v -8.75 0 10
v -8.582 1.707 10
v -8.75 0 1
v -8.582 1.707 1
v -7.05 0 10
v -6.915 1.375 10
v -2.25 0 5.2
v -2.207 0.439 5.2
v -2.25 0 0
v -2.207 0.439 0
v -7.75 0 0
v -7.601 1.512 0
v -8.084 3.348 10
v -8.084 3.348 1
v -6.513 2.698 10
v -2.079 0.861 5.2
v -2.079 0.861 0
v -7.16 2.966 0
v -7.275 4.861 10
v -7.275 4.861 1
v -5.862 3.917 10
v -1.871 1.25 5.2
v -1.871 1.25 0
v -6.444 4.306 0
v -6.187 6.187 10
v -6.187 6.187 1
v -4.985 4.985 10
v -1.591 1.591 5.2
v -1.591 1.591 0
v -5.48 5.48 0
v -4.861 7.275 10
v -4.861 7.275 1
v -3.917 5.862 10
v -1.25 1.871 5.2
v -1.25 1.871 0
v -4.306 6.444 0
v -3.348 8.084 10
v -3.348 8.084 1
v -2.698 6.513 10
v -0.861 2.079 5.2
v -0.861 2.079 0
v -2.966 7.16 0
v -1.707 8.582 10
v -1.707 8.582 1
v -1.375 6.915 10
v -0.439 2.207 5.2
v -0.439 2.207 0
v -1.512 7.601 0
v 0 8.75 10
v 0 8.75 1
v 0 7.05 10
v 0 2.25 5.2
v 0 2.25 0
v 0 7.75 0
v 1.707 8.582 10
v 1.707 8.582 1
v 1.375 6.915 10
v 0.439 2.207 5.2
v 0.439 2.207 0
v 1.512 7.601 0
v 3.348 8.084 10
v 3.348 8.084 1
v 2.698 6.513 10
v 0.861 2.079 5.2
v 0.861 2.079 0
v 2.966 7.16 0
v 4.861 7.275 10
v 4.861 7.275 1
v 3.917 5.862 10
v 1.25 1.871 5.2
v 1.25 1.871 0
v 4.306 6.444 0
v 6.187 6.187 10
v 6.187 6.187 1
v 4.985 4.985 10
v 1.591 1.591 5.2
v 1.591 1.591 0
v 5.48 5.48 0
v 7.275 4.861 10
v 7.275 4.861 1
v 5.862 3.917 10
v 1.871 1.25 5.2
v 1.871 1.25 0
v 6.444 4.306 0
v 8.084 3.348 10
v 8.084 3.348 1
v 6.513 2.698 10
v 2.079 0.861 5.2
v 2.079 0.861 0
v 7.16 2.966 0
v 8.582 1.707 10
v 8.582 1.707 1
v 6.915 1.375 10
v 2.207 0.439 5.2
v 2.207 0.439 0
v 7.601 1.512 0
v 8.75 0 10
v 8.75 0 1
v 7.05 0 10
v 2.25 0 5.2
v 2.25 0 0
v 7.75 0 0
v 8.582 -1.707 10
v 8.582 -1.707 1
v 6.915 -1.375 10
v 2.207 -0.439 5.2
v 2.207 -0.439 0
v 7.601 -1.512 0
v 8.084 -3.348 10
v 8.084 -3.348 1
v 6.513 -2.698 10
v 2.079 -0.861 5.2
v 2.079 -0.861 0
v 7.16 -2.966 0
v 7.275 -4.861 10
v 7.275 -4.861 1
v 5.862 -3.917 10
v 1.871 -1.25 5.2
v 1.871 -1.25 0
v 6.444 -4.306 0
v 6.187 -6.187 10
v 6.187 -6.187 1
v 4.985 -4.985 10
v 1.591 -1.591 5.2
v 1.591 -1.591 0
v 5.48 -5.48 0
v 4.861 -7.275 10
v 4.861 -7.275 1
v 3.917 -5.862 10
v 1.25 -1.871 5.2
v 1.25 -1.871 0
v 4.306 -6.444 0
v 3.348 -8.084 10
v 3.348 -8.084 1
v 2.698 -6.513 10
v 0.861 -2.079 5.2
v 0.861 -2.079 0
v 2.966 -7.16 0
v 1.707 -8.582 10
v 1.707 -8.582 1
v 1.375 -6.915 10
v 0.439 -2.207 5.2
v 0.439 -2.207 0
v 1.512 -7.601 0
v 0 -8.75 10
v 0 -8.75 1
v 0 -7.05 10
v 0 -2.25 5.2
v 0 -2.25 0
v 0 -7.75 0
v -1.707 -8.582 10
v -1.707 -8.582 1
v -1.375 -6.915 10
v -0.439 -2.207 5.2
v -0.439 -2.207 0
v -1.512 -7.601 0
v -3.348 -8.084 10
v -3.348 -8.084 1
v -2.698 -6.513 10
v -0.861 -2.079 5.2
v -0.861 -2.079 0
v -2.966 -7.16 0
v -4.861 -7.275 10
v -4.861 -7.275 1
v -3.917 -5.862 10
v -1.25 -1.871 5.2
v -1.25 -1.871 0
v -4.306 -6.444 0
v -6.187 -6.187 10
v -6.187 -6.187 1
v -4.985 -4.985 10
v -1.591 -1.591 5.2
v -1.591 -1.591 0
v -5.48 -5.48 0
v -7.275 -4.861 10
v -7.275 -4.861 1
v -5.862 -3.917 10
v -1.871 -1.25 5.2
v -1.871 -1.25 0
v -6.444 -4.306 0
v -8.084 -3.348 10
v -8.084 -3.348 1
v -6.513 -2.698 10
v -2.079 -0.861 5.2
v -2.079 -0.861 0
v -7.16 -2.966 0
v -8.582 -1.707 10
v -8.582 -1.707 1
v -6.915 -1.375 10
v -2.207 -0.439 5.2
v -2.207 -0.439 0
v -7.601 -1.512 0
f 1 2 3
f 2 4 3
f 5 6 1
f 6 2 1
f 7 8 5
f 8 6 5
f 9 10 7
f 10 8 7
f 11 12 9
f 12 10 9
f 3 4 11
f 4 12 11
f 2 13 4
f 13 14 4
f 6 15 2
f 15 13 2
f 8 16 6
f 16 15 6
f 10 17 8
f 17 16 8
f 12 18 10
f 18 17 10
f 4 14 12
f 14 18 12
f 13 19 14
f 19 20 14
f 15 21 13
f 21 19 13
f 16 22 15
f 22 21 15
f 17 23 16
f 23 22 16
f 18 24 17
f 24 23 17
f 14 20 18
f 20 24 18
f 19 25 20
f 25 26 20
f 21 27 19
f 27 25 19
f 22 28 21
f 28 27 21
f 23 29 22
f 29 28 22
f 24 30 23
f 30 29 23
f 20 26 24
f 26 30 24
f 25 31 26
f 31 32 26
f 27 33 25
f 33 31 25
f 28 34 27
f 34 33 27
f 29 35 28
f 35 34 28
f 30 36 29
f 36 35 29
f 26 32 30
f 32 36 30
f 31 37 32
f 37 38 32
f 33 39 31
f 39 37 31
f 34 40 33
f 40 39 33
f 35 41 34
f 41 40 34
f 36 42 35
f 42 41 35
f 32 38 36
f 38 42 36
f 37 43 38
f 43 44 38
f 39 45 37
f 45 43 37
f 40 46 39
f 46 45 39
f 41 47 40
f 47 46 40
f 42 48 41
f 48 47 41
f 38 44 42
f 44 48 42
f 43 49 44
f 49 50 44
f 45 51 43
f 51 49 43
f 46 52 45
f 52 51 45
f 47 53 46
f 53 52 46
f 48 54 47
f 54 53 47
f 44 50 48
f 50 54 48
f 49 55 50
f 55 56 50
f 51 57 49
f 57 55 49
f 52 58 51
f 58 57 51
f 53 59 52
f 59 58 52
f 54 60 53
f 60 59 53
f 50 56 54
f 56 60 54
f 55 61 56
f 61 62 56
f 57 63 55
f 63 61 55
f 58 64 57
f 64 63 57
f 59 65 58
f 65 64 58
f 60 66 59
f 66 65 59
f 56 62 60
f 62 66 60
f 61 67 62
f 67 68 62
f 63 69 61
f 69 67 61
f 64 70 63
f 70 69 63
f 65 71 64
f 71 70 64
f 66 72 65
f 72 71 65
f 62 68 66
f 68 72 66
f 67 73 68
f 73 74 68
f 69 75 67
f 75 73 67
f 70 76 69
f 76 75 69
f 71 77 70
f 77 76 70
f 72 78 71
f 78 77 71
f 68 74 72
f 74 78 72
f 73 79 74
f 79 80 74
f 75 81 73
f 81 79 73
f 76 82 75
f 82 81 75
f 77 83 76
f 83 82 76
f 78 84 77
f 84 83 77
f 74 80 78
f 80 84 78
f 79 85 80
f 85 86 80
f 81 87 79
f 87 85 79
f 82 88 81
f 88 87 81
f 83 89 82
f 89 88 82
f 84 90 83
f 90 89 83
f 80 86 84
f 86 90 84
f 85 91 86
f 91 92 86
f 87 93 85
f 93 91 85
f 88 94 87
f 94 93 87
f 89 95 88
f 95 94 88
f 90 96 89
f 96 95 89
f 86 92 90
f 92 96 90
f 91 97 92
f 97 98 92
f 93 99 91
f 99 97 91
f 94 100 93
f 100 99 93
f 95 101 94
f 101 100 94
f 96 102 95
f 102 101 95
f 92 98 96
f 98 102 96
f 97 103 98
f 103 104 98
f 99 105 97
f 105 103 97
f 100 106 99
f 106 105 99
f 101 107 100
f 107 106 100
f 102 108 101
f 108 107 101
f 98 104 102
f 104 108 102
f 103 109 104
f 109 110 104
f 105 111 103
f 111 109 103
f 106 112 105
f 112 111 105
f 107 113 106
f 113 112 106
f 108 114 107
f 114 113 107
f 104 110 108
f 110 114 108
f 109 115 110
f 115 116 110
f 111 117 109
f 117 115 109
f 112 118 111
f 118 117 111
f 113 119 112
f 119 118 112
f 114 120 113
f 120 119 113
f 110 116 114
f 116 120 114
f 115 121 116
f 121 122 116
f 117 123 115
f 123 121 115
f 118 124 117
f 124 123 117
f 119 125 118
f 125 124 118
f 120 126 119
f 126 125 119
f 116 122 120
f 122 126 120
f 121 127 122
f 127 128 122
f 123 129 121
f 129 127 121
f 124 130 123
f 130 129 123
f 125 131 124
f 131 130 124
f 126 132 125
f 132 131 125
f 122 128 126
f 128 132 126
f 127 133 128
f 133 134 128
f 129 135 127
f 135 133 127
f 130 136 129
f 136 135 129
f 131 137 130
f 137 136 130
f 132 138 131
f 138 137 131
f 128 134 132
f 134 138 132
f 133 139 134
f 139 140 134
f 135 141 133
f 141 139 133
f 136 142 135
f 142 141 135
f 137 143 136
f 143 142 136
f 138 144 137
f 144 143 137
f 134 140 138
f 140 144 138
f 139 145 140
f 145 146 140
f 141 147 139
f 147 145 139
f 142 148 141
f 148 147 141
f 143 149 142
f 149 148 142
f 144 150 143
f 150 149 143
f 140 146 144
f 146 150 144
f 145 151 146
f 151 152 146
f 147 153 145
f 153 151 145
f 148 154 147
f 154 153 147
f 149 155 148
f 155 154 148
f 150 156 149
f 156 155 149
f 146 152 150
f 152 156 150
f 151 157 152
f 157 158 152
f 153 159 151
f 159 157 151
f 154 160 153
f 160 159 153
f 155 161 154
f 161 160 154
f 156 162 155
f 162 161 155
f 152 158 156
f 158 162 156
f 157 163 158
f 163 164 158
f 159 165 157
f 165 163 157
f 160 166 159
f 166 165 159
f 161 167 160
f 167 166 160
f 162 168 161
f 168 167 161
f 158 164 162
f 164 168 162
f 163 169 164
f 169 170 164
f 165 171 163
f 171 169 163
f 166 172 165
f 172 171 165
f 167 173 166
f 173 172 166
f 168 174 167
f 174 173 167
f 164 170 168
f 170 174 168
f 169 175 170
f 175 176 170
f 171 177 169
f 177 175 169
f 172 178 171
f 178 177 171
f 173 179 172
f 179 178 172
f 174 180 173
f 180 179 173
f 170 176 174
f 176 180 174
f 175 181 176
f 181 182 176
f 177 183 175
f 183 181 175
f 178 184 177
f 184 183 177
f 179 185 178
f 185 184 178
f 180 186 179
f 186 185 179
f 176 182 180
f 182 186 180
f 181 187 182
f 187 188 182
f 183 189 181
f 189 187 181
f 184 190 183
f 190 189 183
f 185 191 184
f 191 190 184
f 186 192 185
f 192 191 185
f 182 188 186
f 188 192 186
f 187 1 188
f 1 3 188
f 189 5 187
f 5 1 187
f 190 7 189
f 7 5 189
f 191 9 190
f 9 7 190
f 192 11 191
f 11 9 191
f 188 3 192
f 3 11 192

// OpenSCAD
$fn = 32;

// ----------------------------------------------------------------------
// Form washer: countersunk washer, 17.5 mm outside, 4.5 mm bore
// ----------------------------------------------------------------------

// --- parameters (mm) ---
revolve_angle = 360;      // full turn around the Z axis
profile_points = 6;       // points of the closed outline

profile = [[2.25, 0], [7.75, 0], [8.75, 1], [8.75, 10], [7.05, 10], [2.25, 5.2]];  // single closed polygon, 6 points, counter clockwise

// --- the one profile operation ---
rotate_extrude(angle = revolve_angle) polygon(points = profile);
